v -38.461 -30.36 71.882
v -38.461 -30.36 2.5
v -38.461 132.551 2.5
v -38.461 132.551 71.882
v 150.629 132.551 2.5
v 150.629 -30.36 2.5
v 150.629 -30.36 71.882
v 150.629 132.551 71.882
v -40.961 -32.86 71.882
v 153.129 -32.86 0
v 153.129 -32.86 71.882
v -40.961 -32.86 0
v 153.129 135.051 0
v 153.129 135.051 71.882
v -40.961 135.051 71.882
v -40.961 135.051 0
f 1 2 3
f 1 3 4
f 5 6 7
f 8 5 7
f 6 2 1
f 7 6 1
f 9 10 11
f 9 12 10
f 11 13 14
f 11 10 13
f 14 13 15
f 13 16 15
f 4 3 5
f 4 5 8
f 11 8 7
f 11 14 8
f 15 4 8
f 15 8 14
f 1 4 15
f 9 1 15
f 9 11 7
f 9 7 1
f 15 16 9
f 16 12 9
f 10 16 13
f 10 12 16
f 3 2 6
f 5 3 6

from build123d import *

# Parameters (mm, degrees)
F0_W     = 113.0900681019
F0_H     = 62.9108082503
F1_DEPTH = 71.882
F2_DEPTH = 81
F3_DEPTH = 105
F4_T     = -2.5


with BuildPart() as f1:
    # F0 (on Top) → F1 (new body)
    with BuildSketch(Plane.XY):
        with Locations((15.5839696527, -1.4044689015)):
            Rectangle(F0_W, F0_H)
    extrude(amount=F1_DEPTH)

    # F2 (add): a face of the model
    f2_faces = [f1.faces().sort_by_distance(p)[0] for p in [
        (72.1290037036, -1.4044689015, 35.941),
    ]]
    extrude(f2_faces, amount=F2_DEPTH)

    # F3 (add): a face of the model
    f3_faces = [f1.faces().sort_by_distance(p)[0] for p in [
        (56.0839696527, 30.0509352237, 35.941),
    ]]
    extrude(f3_faces, amount=F3_DEPTH)

    # F4
    f4_openings = [f1.faces().sort_by_distance(p)[0] for p in [
        (56.08397, 51.095531, 71.882),
    ]]
    offset(amount=F4_T, openings=f4_openings)


solid = f1.part
